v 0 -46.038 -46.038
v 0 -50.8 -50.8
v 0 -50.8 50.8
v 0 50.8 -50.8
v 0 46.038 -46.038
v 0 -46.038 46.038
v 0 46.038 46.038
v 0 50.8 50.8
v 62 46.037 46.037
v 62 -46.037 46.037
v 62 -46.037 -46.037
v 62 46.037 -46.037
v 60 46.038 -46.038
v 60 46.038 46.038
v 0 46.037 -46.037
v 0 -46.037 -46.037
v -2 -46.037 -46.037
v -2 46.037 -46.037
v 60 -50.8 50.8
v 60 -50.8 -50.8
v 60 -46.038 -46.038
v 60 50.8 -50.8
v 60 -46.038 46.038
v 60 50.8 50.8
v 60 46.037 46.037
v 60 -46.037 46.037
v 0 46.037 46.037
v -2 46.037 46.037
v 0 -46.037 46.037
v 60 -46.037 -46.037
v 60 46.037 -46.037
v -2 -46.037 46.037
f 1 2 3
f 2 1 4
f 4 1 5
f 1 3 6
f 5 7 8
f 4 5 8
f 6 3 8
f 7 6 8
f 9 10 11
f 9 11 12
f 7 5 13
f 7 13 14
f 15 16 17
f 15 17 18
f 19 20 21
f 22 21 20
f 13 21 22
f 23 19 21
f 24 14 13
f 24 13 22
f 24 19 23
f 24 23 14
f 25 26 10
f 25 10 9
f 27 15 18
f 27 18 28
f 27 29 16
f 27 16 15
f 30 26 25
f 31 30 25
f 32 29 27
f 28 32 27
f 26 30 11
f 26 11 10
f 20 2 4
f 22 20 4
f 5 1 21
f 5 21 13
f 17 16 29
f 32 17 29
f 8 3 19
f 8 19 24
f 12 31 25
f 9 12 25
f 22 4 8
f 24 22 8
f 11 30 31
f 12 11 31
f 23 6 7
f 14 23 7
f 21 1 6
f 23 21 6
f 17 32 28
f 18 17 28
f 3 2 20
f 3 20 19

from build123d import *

# Parameters (mm, degrees)
MEMBER_1_OUTLINE_W               = 101.6
MEMBER_1_OUTLINE_H               = 101.6
MEMBER_1_OUTLINE_W_2             = 92.075
MEMBER_1_OUTLINE_H_2             = 92.075
MEMBER_1_DEPTH                   = 60
ENDCAP_T2_STRUCTURAL_INSET       = 4.7625
ENDCAP_T2_STRUCTURAL_THICKNESS   = 2
ENDCAP_T2_STRUCTURAL_4_INSET     = 4.7625
ENDCAP_T2_STRUCTURAL_4_THICKNESS = 2


# Read off the part's stored shape, not the designer's step: the member step
with BuildPart() as part:
    # Member 1 outline → Member 1 (new body)
    with BuildSketch(Plane.YZ):
        Rectangle(MEMBER_1_OUTLINE_W, MEMBER_1_OUTLINE_H)
        Rectangle(MEMBER_1_OUTLINE_W_2, MEMBER_1_OUTLINE_H_2, mode=Mode.SUBTRACT)
    extrude(amount=MEMBER_1_DEPTH)


with BuildPart() as body_2:
    # endcap_t2_structural: an end cap: a plate 2.0 thick on the member's open end, its outline the end's outer outline set in by 4.7625
    endcap_t2_structural_end = part.part.faces().sort_by_distance((0, 49.276, 49.276))[0]
    add(extrude(Face(endcap_t2_structural_end.outer_wire().offset_2d(-ENDCAP_T2_STRUCTURAL_INSET)), amount=ENDCAP_T2_STRUCTURAL_THICKNESS, dir=(-1, 0, 0)))


with BuildPart() as body_3:
    # endcap_t2_structural 4: an end cap: a plate 2.0 thick on the member's open end, its outline the end's outer outline set in by 4.7625
    endcap_t2_structural_4_end = part.part.faces().sort_by_distance((60, 49.276, -49.276))[0]
    add(extrude(Face(endcap_t2_structural_4_end.outer_wire().offset_2d(-ENDCAP_T2_STRUCTURAL_4_INSET)), amount=ENDCAP_T2_STRUCTURAL_4_THICKNESS, dir=(1, 0, 0)))


solid = Compound([part.part, body_2.part, body_3.part])
